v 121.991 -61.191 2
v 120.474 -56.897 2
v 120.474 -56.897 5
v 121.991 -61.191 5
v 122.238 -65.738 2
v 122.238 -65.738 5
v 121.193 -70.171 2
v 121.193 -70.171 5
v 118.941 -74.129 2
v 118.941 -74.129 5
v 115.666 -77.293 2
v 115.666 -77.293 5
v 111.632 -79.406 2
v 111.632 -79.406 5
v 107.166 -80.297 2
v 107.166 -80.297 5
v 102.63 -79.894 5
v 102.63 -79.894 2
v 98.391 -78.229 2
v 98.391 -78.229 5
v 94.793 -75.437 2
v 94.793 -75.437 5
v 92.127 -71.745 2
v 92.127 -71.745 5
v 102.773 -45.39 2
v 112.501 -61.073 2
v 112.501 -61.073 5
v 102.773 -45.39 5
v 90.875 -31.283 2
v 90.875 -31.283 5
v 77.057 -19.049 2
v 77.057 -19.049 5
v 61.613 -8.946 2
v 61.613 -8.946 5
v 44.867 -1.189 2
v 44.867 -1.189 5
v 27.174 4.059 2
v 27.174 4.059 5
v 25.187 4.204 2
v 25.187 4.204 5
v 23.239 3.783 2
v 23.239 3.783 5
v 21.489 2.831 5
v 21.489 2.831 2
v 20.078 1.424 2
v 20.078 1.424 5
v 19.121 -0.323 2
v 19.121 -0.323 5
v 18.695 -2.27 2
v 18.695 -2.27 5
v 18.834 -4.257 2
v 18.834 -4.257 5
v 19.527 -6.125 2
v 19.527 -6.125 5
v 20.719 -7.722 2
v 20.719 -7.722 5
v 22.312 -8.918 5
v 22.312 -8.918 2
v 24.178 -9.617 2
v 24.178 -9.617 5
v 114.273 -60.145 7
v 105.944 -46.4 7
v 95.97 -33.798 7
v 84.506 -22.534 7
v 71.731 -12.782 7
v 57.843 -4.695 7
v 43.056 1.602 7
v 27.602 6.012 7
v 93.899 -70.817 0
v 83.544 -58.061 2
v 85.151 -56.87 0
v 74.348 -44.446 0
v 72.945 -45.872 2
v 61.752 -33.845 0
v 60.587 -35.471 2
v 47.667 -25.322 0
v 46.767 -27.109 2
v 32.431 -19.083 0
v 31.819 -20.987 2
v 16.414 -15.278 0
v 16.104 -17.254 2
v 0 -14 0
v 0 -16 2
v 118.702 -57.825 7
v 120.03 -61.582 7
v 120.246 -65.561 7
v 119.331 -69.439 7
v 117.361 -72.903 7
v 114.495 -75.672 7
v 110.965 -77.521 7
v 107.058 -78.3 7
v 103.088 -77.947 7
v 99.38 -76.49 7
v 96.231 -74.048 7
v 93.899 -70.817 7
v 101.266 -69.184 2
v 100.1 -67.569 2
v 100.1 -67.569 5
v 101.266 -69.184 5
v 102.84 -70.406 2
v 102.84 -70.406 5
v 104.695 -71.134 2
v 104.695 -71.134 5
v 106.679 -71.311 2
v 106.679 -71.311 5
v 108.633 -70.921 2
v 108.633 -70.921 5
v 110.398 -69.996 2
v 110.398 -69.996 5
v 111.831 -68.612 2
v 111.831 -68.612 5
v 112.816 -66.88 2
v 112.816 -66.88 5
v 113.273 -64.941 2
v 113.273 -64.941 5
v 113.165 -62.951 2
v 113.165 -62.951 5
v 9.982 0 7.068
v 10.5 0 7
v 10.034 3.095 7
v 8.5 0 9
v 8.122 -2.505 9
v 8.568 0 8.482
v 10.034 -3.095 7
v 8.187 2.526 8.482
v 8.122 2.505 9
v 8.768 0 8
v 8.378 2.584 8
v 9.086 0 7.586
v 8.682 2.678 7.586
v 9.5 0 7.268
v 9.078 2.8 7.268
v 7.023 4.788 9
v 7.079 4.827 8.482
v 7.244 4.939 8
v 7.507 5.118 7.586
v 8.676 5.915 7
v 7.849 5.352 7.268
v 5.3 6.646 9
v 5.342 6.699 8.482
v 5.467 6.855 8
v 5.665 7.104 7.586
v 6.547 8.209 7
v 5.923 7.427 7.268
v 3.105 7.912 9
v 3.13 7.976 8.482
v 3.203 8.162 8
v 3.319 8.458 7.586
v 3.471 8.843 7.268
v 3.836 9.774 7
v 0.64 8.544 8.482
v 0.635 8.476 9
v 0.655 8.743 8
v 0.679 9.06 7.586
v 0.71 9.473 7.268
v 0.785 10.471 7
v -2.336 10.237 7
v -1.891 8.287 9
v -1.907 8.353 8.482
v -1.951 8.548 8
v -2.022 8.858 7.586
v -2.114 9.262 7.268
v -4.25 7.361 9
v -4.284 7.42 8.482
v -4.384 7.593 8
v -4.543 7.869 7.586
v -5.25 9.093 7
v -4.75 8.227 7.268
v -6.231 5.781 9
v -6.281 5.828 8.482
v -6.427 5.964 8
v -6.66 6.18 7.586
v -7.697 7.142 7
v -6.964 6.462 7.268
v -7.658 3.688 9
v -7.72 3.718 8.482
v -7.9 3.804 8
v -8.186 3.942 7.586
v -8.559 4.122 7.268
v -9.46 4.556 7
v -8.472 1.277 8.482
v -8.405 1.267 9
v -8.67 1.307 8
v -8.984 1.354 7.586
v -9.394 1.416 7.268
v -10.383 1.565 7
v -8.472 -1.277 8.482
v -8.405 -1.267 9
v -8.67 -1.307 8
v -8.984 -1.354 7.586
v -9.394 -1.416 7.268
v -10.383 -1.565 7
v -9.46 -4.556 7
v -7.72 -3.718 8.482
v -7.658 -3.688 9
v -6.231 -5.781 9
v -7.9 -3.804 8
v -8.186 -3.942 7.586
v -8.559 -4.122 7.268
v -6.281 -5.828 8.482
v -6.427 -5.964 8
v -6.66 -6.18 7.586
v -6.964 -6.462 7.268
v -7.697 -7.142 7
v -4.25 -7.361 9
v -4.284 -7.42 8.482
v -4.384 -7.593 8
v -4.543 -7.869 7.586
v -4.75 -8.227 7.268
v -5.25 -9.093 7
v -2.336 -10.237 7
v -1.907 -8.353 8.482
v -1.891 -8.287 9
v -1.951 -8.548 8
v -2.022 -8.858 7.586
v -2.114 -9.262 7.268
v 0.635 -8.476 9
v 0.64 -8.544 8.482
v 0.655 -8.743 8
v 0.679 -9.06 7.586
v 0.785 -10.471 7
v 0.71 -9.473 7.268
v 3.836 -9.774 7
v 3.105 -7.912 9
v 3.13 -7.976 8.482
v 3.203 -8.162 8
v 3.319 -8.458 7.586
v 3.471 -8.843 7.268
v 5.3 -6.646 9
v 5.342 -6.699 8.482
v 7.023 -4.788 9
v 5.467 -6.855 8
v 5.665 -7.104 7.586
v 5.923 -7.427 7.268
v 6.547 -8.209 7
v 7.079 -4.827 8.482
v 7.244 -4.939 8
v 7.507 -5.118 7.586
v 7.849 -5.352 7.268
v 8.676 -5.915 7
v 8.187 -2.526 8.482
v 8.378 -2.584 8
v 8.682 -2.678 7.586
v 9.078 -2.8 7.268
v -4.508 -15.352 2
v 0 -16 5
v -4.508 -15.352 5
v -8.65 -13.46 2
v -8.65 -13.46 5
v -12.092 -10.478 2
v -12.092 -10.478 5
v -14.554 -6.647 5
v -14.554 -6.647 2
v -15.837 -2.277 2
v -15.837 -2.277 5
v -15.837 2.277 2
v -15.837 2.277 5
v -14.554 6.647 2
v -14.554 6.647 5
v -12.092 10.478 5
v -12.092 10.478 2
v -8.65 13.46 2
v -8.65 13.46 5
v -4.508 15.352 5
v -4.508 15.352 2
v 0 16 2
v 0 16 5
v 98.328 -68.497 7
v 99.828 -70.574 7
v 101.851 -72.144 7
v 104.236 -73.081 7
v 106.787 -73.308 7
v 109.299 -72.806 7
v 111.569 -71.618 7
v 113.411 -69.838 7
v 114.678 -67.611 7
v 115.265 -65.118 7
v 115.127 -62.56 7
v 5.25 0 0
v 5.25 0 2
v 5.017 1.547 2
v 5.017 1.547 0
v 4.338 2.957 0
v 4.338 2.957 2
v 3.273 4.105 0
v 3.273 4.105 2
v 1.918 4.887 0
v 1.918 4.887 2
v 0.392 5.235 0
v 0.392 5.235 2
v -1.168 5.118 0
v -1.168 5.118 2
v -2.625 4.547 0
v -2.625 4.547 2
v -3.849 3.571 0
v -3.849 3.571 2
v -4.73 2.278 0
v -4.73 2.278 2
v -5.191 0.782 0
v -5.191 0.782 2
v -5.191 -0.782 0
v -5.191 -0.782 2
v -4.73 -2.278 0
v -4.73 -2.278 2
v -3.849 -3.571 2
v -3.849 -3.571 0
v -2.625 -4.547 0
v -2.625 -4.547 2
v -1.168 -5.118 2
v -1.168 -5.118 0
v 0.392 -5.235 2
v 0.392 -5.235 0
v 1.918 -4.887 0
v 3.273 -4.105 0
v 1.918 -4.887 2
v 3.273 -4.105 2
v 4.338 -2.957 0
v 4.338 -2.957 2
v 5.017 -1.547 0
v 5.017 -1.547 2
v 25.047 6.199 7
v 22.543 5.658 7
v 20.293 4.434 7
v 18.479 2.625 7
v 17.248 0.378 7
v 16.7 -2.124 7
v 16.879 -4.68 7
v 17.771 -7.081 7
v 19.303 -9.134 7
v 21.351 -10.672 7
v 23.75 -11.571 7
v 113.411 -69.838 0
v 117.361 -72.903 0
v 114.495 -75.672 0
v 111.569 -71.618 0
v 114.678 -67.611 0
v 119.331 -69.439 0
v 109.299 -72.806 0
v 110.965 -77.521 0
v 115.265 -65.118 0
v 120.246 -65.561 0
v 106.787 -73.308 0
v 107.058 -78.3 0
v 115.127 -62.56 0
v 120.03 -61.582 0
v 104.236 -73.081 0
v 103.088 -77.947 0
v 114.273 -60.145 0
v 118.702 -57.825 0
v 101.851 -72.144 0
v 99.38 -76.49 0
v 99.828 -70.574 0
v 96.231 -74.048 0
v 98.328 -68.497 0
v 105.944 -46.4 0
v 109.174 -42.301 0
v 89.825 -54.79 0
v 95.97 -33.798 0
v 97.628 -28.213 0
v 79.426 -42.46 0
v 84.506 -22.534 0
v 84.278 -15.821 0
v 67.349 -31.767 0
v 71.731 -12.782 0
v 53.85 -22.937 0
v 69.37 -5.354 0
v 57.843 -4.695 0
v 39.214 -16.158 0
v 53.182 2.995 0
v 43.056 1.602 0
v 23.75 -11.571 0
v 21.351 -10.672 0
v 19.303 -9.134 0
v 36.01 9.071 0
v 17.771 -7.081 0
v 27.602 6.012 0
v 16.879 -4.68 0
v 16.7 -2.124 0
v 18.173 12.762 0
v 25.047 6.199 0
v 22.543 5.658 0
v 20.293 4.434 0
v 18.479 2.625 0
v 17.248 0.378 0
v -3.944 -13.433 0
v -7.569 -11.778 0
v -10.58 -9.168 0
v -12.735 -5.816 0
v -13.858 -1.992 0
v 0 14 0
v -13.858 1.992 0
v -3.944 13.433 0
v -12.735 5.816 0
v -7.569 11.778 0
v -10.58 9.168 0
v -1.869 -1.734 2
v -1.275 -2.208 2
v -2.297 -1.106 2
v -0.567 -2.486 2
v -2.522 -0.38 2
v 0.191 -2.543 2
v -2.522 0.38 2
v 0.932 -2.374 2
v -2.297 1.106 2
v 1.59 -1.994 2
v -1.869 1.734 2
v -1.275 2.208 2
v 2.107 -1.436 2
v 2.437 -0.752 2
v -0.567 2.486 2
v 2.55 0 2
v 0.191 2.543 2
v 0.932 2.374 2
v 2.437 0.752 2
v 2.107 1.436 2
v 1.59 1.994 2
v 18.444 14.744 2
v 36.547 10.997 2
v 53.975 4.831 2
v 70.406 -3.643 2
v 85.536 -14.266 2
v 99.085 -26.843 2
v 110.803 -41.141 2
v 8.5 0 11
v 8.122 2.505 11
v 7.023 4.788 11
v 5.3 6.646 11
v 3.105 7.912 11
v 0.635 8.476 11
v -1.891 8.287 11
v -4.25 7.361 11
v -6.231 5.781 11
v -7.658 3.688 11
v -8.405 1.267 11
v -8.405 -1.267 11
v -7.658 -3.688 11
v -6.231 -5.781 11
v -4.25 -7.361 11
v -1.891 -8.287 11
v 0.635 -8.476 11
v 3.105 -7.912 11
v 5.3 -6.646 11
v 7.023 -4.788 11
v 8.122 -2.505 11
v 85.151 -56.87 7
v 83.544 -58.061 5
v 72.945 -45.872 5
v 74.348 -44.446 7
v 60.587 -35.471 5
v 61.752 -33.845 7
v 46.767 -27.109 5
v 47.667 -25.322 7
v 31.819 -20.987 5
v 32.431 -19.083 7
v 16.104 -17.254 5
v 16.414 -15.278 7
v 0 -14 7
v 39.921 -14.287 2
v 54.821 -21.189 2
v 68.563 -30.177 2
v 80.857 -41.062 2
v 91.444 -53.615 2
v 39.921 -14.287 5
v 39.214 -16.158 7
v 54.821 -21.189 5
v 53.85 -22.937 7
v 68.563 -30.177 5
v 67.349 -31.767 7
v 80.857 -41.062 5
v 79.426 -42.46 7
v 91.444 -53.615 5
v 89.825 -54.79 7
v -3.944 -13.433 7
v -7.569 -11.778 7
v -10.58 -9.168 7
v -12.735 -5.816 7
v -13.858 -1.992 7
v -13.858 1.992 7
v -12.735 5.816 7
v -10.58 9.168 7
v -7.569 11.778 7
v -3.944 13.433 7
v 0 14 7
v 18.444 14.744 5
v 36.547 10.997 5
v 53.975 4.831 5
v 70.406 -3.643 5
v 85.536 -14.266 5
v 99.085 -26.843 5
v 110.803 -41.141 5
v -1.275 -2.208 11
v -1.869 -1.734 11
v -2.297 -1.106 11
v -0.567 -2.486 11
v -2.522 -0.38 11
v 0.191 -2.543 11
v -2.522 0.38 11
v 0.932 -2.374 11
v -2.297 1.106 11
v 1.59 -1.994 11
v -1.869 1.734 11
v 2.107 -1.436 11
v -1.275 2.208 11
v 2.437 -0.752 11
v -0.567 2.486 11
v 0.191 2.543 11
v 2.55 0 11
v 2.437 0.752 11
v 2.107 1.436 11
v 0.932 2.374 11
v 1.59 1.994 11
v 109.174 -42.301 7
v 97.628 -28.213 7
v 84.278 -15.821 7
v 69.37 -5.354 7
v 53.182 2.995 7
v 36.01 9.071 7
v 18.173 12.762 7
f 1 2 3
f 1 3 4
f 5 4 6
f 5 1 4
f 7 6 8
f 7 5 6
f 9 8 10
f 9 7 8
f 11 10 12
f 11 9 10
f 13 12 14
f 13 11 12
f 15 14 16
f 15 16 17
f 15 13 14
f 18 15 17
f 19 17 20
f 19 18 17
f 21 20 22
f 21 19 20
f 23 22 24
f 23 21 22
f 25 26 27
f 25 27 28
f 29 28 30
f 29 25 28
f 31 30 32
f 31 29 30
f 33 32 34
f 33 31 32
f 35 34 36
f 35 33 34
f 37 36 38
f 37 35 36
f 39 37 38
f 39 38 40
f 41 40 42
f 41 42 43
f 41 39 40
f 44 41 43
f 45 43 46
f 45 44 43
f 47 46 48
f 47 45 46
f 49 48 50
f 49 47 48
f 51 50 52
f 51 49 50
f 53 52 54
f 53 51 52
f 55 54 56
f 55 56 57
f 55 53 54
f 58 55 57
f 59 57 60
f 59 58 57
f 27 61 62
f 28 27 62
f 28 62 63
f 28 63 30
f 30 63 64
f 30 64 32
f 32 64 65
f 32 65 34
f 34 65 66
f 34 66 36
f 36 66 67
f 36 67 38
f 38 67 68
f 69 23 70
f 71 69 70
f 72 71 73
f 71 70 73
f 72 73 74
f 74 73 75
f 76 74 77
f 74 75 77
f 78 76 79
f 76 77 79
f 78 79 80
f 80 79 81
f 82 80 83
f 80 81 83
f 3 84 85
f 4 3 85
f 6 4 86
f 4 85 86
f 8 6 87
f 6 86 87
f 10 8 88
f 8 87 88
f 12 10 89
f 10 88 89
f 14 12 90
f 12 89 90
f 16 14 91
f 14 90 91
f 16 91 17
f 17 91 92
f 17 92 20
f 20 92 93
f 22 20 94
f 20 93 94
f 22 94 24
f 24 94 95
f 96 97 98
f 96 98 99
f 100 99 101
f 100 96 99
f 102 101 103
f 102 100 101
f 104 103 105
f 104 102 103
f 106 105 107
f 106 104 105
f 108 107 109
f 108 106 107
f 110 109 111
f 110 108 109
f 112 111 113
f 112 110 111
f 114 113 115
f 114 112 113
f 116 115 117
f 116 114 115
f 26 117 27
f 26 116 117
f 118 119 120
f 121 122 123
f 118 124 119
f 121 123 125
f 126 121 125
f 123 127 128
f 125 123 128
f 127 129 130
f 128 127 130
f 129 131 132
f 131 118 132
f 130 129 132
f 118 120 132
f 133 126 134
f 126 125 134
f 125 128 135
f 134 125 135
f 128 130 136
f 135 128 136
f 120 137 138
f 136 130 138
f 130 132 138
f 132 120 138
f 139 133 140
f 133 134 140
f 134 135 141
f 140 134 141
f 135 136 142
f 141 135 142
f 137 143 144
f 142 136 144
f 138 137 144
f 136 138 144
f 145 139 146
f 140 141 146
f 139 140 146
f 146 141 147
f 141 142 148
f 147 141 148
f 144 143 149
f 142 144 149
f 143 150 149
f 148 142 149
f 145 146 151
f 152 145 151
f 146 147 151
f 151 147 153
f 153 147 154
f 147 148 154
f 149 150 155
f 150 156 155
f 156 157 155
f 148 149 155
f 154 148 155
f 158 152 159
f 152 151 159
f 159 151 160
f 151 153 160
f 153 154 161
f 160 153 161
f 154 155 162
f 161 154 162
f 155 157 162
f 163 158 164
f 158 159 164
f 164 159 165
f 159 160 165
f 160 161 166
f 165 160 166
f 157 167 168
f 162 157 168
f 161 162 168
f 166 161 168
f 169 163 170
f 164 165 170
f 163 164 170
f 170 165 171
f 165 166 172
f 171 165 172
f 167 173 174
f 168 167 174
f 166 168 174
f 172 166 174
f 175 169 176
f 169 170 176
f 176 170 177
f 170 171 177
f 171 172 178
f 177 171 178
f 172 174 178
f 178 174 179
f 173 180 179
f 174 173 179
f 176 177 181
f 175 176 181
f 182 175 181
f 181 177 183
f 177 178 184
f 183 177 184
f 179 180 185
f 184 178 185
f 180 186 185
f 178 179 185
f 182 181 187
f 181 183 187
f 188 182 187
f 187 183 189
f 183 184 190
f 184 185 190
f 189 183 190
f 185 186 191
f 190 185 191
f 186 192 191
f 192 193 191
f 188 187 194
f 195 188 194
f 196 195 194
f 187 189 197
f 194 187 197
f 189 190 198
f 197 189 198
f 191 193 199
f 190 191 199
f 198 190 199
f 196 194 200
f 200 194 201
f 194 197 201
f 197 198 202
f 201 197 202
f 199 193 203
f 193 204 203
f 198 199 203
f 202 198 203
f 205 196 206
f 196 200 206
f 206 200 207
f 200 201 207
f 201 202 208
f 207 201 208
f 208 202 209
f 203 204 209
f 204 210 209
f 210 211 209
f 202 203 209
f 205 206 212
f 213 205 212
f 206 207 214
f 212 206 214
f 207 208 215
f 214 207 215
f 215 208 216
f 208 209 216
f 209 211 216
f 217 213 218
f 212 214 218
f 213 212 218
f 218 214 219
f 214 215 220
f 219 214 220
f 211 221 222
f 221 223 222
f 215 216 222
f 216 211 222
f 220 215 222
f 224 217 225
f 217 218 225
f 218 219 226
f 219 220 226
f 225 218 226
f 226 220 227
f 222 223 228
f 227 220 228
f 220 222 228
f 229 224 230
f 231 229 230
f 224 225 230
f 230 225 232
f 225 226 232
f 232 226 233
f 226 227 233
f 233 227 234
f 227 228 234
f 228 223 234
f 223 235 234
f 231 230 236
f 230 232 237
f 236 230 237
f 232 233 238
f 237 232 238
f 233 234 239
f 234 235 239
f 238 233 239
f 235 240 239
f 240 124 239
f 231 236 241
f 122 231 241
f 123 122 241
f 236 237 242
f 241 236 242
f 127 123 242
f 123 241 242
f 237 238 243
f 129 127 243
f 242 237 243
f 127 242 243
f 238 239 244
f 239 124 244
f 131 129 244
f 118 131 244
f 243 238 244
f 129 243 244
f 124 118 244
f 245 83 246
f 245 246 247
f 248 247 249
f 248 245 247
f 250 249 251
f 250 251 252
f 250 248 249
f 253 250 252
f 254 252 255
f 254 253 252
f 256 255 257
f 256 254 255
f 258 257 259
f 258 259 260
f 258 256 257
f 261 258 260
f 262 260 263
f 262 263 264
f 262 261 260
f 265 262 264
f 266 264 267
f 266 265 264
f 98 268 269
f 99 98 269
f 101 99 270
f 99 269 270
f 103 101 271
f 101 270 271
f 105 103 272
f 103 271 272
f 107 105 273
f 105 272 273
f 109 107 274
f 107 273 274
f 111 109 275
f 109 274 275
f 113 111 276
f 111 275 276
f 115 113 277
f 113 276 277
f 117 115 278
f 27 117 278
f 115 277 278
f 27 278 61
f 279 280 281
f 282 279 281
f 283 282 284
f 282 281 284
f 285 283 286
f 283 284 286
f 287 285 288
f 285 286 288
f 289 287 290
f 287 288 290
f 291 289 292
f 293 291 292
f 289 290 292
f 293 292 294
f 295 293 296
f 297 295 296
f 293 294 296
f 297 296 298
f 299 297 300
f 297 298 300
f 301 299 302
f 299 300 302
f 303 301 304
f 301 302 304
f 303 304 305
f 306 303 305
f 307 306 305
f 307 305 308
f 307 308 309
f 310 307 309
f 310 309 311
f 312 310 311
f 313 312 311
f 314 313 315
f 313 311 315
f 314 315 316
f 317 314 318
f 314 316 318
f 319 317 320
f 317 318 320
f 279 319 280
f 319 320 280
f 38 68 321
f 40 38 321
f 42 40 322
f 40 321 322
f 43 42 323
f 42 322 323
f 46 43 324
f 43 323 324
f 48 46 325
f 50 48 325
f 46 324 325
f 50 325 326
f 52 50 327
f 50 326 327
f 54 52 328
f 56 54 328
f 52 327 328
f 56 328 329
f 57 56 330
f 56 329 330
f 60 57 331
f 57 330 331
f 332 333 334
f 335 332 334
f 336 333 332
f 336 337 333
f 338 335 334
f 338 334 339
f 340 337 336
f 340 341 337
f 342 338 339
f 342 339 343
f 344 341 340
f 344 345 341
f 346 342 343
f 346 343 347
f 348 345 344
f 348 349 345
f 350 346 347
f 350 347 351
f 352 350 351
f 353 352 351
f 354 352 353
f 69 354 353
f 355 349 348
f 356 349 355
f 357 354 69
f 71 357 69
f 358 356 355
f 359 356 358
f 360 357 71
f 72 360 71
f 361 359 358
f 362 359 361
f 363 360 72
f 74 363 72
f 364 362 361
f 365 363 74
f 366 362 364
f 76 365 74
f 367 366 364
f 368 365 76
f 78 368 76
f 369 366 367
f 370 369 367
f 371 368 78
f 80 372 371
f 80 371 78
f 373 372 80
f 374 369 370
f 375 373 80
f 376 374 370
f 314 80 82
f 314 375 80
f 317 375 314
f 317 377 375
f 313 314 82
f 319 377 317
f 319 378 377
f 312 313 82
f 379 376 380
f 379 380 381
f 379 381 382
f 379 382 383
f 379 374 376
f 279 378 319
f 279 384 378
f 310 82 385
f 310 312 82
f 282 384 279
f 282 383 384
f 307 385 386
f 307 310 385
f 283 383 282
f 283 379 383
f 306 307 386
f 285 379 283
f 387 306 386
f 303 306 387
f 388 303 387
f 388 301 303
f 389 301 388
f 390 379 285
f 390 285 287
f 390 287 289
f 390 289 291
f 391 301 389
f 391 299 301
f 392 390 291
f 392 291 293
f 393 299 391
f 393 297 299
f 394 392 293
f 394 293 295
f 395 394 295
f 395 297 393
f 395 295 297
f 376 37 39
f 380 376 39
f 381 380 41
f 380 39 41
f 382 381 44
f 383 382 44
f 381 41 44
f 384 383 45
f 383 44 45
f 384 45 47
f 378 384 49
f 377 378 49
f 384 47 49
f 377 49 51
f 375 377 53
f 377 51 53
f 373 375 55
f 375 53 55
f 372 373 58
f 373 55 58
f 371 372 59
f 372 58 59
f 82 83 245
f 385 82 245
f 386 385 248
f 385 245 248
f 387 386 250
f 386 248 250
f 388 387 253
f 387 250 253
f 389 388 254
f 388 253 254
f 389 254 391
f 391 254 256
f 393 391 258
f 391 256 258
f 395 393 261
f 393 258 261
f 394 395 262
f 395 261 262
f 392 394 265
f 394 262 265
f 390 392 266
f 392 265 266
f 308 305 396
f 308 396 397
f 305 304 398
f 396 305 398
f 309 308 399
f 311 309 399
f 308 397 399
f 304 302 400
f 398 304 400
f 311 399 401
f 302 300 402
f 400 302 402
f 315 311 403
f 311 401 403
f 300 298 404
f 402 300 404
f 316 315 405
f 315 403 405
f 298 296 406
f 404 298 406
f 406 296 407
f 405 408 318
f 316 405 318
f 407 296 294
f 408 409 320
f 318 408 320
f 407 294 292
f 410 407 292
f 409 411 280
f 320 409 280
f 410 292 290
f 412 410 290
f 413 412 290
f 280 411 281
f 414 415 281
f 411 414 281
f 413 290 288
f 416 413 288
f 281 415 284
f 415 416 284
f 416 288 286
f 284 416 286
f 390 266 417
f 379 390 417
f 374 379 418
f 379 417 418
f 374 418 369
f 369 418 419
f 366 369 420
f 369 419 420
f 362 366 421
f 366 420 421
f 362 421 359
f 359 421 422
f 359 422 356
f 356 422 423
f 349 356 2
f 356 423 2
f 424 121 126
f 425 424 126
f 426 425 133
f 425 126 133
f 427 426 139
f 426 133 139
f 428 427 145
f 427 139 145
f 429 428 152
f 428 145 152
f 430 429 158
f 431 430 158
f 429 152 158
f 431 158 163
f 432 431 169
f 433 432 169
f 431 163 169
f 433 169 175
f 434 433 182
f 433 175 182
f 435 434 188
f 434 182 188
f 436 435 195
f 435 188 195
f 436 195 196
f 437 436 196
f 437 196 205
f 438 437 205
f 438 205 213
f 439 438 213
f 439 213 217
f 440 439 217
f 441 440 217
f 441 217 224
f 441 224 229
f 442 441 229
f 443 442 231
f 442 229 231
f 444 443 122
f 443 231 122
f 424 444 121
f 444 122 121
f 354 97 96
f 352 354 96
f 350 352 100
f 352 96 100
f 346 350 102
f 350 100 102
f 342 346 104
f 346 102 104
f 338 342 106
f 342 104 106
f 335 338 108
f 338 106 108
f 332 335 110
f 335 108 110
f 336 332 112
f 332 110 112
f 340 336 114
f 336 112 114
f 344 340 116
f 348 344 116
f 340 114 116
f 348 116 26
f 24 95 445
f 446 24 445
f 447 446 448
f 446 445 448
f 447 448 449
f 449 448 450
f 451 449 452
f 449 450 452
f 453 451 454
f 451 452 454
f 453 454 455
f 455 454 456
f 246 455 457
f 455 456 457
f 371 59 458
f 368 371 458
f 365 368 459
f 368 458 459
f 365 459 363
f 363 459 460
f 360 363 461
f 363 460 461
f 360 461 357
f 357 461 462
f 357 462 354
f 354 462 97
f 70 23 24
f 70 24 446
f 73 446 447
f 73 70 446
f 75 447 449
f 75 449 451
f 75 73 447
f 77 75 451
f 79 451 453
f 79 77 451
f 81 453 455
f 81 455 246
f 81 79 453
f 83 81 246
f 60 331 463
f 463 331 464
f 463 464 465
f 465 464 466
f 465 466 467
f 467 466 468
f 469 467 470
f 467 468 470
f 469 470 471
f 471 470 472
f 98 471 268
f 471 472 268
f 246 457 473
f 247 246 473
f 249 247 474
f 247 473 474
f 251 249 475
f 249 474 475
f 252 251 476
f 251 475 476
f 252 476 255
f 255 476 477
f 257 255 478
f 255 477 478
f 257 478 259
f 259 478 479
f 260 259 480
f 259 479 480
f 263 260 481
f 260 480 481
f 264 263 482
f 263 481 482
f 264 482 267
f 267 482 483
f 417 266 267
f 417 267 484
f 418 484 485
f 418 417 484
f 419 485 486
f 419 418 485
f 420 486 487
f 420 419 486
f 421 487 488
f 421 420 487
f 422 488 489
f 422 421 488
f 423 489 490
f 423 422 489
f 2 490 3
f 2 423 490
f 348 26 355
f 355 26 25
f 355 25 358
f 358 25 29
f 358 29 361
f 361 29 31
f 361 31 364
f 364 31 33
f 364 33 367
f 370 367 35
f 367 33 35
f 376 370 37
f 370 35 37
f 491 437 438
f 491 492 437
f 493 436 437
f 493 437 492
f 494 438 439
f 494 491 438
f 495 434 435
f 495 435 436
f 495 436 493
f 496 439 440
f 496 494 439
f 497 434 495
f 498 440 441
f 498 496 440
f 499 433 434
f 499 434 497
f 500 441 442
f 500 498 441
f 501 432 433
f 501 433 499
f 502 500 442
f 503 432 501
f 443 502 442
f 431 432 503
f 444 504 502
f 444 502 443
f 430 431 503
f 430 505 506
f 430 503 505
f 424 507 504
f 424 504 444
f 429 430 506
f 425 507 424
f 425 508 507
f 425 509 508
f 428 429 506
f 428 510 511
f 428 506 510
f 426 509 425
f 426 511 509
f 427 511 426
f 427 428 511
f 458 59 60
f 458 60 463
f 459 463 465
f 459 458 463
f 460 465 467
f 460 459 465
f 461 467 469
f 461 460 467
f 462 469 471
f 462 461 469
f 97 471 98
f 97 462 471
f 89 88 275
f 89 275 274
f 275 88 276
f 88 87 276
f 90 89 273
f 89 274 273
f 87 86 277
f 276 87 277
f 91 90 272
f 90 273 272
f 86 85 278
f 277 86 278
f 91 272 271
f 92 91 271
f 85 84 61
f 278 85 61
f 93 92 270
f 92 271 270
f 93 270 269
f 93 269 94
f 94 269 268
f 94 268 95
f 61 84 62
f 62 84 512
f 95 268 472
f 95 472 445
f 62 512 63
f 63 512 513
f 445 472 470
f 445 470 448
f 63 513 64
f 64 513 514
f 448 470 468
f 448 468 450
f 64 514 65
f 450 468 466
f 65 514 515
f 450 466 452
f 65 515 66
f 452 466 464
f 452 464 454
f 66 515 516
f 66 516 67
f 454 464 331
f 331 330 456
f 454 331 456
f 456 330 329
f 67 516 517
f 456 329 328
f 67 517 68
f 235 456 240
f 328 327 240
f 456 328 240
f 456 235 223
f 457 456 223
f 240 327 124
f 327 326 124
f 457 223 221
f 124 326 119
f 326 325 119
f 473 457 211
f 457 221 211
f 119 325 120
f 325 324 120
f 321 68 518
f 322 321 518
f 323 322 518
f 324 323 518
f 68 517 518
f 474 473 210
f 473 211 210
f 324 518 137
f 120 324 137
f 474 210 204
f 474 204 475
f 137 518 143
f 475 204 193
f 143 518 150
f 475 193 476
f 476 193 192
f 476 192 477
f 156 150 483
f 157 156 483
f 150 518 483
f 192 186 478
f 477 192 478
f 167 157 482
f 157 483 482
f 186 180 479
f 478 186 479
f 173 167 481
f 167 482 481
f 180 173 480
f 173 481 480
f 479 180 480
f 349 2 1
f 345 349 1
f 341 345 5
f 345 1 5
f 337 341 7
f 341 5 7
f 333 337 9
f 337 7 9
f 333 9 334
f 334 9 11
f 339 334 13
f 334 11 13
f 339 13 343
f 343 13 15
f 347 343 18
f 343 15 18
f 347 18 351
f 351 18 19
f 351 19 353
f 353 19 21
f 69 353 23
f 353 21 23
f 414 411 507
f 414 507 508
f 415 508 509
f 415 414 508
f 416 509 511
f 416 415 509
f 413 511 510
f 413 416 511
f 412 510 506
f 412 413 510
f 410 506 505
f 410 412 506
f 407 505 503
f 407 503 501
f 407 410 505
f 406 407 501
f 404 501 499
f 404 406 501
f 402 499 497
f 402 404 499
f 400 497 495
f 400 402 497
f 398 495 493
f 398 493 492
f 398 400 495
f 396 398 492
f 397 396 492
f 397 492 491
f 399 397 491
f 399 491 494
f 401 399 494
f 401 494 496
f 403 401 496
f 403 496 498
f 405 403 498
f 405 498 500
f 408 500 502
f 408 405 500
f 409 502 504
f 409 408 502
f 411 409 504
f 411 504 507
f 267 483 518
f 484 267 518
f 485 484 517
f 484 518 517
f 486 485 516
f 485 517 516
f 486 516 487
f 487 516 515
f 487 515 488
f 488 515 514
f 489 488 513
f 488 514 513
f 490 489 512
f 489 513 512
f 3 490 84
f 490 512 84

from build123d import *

# Parameters (mm, degrees)
SKETCH1_R           = 8.5
SKETCH1_R_2         = 2.55
BOSS_EXTRUDE1_DEPTH = 7
BOSS_EXTRUDE2_START = 7
SKETCH1_3_R         = 8.5
SKETCH1_3_R_2       = 2.55
BOSS_EXTRUDE2_DEPTH = 4
CHAMFER1_SIZE       = 2
FILLET2_R           = 2
CUT_EXTRUDE1_START  = -9
SKETCH2_R           = 5.25
CUT_EXTRUDE1_DEPTH  = 2


with BuildPart() as part:
    # Sketch1 → Boss-Extrude1 (new body)
    with BuildSketch(Plane.XY):
        with BuildLine():
            ThreePointArc((92.127210642, -71.744668074), (53.839787702, -31.020916727), (0, -16))
            ThreePointArc((0, -16), (-16, 0), (0, 16))
            ThreePointArc((0, 16), (70.405876226, -3.642737258), (120.474044686, -56.896873635))
            ThreePointArc((120.474044686, -56.896873635), (113.724524883, -78.494187876), (92.127210642, -71.744668074))
        make_face()
        Circle(SKETCH1_R, mode=Mode.SUBTRACT)
        with BuildLine():
            ThreePointArc((112.501497611, -61.072815821), (77.057279191, -19.048646747), (27.173726746, 4.058810952))
            ThreePointArc((27.173726746, 4.058810952), (18.838075062, -1.2813118), (24.178197814, -9.616963484))
            ThreePointArc((24.178197814, -9.616963484), (68.562775973, -30.177142381), (100.099757717, -67.568725888))
            ThreePointArc((100.099757717, -67.568725888), (109.548582697, -70.521640801), (112.501497611, -61.072815821))
        make_face(mode=Mode.SUBTRACT)
        Circle(SKETCH1_R)
        Circle(SKETCH1_R_2, mode=Mode.SUBTRACT)
    extrude(amount=BOSS_EXTRUDE1_DEPTH)

    # Sketch1<3> → Boss-Extrude2 (add)
    with BuildSketch(Plane.XY.offset(BOSS_EXTRUDE2_START)):
        Circle(SKETCH1_3_R)
        Circle(SKETCH1_3_R_2, mode=Mode.SUBTRACT)
    extrude(amount=BOSS_EXTRUDE2_DEPTH)

    # Chamfer1
    chamfer1_edges = [part.edges().sort_by_distance(p)[0] for p in [
        (113.724524883, -78.494187876, 7),
        (18.838075062, -1.2813118, 0),
        (68.562775973, -30.177142381, 0),
        (109.548582697, -70.521640801, 0),
        (77.057279191, -19.048646747, 0),
        (-16, 0, 0),
        (70.405876226, -3.642737258, 0),
        (113.724524883, -78.494187876, 0),
        (70.405876226, -3.642737258, 7),
        (53.839787702, -31.020916727, 0),
        (-16, 0, 7),
        (77.057279191, -19.048646747, 7),
        (109.548582697, -70.521640801, 7),
        (68.562775973, -30.177142381, 7),
        (18.838075062, -1.2813118, 7),
        (53.839787702, -31.020916727, 7),
    ]]
    chamfer(chamfer1_edges, length=CHAMFER1_SIZE)

    # Fillet2
    fillet2_edges = [part.edges().sort_by_distance(p)[0] for p in [
        (-8.5, 0, 7),
    ]]
    fillet(fillet2_edges, radius=FILLET2_R)

    # Sketch2 → Cut-Extrude1 (cut)
    with BuildSketch(Plane.XY.offset(11).offset(CUT_EXTRUDE1_START)):
        Circle(SKETCH2_R)
    extrude(amount=-CUT_EXTRUDE1_DEPTH, mode=Mode.SUBTRACT)


solid = part.part
